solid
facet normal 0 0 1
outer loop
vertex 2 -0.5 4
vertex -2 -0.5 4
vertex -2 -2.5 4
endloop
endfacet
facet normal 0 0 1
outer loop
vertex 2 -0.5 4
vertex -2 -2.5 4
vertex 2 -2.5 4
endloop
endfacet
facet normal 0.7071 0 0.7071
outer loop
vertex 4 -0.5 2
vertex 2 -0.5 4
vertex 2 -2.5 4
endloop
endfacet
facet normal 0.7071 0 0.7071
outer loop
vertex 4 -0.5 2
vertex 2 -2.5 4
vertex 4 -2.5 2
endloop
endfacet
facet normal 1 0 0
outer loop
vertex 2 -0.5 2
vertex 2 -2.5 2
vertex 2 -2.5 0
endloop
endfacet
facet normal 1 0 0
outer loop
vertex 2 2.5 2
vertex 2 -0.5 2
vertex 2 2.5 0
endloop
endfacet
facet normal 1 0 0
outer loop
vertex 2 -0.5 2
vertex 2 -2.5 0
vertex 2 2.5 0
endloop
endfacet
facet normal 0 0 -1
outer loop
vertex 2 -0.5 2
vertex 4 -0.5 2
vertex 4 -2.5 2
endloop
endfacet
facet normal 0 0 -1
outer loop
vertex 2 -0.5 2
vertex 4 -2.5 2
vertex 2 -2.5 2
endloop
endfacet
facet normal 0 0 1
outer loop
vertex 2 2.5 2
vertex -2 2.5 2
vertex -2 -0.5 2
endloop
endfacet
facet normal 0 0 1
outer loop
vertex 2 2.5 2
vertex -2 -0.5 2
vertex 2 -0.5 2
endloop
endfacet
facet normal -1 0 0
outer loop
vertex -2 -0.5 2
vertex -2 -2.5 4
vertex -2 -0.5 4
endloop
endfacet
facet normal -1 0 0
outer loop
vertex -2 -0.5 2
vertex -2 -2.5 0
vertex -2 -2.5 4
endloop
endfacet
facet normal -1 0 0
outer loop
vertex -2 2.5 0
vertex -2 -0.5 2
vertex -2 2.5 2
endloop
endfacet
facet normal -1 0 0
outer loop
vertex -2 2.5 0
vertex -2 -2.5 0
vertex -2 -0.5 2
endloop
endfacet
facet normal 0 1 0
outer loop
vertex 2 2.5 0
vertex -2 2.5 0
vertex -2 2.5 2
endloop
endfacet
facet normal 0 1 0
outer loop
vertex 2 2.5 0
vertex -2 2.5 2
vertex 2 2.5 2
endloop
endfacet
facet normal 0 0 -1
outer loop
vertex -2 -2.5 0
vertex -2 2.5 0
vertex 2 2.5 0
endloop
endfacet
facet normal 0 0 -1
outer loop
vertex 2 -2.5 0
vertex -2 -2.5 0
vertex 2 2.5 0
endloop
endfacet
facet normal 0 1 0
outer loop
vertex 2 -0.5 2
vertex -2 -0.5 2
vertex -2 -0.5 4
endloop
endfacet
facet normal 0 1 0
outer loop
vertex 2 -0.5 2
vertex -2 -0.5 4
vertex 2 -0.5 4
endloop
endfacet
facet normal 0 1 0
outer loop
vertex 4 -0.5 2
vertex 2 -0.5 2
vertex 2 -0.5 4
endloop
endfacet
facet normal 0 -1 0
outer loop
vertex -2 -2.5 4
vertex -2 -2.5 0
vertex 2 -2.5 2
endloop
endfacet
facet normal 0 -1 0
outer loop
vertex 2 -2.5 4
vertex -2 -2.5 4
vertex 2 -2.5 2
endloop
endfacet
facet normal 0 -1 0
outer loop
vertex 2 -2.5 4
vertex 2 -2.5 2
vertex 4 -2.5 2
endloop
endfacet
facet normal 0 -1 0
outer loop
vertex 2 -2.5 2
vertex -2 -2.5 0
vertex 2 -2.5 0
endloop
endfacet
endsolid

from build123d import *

# Parameters (mm, degrees)
SKETCH1_W           = 4
SKETCH1_H           = 5
BOSS_EXTRUDE1_DEPTH = 2
SKETCH2_W           = 4
SKETCH2_H           = 2
BOSS_EXTRUDE2_DEPTH = 2
BOSS_EXTRUDE3_DEPTH = 2


with BuildPart() as part:
    # Sketch1 → Boss-Extrude1 (new body)
    with BuildSketch(Plane.XY):
        Rectangle(SKETCH1_W, SKETCH1_H)
    extrude(amount=BOSS_EXTRUDE1_DEPTH)

    # Sketch2 → Boss-Extrude2 (add)
    with BuildSketch(Plane.XY.offset(2)):
        with Locations((0, -1.5)):
            Rectangle(SKETCH2_W, SKETCH2_H)
    extrude(amount=BOSS_EXTRUDE2_DEPTH)

    # Sketch3 → Boss-Extrude3 (add)
    with BuildSketch(Plane(origin=(0, -0.5, 0), x_dir=(1, 0, 0), z_dir=(0, 1, 0))):
        Polygon((2, -4), (4, -2), (2, -2), align=None)
    extrude(amount=-BOSS_EXTRUDE3_DEPTH)


solid = part.part
